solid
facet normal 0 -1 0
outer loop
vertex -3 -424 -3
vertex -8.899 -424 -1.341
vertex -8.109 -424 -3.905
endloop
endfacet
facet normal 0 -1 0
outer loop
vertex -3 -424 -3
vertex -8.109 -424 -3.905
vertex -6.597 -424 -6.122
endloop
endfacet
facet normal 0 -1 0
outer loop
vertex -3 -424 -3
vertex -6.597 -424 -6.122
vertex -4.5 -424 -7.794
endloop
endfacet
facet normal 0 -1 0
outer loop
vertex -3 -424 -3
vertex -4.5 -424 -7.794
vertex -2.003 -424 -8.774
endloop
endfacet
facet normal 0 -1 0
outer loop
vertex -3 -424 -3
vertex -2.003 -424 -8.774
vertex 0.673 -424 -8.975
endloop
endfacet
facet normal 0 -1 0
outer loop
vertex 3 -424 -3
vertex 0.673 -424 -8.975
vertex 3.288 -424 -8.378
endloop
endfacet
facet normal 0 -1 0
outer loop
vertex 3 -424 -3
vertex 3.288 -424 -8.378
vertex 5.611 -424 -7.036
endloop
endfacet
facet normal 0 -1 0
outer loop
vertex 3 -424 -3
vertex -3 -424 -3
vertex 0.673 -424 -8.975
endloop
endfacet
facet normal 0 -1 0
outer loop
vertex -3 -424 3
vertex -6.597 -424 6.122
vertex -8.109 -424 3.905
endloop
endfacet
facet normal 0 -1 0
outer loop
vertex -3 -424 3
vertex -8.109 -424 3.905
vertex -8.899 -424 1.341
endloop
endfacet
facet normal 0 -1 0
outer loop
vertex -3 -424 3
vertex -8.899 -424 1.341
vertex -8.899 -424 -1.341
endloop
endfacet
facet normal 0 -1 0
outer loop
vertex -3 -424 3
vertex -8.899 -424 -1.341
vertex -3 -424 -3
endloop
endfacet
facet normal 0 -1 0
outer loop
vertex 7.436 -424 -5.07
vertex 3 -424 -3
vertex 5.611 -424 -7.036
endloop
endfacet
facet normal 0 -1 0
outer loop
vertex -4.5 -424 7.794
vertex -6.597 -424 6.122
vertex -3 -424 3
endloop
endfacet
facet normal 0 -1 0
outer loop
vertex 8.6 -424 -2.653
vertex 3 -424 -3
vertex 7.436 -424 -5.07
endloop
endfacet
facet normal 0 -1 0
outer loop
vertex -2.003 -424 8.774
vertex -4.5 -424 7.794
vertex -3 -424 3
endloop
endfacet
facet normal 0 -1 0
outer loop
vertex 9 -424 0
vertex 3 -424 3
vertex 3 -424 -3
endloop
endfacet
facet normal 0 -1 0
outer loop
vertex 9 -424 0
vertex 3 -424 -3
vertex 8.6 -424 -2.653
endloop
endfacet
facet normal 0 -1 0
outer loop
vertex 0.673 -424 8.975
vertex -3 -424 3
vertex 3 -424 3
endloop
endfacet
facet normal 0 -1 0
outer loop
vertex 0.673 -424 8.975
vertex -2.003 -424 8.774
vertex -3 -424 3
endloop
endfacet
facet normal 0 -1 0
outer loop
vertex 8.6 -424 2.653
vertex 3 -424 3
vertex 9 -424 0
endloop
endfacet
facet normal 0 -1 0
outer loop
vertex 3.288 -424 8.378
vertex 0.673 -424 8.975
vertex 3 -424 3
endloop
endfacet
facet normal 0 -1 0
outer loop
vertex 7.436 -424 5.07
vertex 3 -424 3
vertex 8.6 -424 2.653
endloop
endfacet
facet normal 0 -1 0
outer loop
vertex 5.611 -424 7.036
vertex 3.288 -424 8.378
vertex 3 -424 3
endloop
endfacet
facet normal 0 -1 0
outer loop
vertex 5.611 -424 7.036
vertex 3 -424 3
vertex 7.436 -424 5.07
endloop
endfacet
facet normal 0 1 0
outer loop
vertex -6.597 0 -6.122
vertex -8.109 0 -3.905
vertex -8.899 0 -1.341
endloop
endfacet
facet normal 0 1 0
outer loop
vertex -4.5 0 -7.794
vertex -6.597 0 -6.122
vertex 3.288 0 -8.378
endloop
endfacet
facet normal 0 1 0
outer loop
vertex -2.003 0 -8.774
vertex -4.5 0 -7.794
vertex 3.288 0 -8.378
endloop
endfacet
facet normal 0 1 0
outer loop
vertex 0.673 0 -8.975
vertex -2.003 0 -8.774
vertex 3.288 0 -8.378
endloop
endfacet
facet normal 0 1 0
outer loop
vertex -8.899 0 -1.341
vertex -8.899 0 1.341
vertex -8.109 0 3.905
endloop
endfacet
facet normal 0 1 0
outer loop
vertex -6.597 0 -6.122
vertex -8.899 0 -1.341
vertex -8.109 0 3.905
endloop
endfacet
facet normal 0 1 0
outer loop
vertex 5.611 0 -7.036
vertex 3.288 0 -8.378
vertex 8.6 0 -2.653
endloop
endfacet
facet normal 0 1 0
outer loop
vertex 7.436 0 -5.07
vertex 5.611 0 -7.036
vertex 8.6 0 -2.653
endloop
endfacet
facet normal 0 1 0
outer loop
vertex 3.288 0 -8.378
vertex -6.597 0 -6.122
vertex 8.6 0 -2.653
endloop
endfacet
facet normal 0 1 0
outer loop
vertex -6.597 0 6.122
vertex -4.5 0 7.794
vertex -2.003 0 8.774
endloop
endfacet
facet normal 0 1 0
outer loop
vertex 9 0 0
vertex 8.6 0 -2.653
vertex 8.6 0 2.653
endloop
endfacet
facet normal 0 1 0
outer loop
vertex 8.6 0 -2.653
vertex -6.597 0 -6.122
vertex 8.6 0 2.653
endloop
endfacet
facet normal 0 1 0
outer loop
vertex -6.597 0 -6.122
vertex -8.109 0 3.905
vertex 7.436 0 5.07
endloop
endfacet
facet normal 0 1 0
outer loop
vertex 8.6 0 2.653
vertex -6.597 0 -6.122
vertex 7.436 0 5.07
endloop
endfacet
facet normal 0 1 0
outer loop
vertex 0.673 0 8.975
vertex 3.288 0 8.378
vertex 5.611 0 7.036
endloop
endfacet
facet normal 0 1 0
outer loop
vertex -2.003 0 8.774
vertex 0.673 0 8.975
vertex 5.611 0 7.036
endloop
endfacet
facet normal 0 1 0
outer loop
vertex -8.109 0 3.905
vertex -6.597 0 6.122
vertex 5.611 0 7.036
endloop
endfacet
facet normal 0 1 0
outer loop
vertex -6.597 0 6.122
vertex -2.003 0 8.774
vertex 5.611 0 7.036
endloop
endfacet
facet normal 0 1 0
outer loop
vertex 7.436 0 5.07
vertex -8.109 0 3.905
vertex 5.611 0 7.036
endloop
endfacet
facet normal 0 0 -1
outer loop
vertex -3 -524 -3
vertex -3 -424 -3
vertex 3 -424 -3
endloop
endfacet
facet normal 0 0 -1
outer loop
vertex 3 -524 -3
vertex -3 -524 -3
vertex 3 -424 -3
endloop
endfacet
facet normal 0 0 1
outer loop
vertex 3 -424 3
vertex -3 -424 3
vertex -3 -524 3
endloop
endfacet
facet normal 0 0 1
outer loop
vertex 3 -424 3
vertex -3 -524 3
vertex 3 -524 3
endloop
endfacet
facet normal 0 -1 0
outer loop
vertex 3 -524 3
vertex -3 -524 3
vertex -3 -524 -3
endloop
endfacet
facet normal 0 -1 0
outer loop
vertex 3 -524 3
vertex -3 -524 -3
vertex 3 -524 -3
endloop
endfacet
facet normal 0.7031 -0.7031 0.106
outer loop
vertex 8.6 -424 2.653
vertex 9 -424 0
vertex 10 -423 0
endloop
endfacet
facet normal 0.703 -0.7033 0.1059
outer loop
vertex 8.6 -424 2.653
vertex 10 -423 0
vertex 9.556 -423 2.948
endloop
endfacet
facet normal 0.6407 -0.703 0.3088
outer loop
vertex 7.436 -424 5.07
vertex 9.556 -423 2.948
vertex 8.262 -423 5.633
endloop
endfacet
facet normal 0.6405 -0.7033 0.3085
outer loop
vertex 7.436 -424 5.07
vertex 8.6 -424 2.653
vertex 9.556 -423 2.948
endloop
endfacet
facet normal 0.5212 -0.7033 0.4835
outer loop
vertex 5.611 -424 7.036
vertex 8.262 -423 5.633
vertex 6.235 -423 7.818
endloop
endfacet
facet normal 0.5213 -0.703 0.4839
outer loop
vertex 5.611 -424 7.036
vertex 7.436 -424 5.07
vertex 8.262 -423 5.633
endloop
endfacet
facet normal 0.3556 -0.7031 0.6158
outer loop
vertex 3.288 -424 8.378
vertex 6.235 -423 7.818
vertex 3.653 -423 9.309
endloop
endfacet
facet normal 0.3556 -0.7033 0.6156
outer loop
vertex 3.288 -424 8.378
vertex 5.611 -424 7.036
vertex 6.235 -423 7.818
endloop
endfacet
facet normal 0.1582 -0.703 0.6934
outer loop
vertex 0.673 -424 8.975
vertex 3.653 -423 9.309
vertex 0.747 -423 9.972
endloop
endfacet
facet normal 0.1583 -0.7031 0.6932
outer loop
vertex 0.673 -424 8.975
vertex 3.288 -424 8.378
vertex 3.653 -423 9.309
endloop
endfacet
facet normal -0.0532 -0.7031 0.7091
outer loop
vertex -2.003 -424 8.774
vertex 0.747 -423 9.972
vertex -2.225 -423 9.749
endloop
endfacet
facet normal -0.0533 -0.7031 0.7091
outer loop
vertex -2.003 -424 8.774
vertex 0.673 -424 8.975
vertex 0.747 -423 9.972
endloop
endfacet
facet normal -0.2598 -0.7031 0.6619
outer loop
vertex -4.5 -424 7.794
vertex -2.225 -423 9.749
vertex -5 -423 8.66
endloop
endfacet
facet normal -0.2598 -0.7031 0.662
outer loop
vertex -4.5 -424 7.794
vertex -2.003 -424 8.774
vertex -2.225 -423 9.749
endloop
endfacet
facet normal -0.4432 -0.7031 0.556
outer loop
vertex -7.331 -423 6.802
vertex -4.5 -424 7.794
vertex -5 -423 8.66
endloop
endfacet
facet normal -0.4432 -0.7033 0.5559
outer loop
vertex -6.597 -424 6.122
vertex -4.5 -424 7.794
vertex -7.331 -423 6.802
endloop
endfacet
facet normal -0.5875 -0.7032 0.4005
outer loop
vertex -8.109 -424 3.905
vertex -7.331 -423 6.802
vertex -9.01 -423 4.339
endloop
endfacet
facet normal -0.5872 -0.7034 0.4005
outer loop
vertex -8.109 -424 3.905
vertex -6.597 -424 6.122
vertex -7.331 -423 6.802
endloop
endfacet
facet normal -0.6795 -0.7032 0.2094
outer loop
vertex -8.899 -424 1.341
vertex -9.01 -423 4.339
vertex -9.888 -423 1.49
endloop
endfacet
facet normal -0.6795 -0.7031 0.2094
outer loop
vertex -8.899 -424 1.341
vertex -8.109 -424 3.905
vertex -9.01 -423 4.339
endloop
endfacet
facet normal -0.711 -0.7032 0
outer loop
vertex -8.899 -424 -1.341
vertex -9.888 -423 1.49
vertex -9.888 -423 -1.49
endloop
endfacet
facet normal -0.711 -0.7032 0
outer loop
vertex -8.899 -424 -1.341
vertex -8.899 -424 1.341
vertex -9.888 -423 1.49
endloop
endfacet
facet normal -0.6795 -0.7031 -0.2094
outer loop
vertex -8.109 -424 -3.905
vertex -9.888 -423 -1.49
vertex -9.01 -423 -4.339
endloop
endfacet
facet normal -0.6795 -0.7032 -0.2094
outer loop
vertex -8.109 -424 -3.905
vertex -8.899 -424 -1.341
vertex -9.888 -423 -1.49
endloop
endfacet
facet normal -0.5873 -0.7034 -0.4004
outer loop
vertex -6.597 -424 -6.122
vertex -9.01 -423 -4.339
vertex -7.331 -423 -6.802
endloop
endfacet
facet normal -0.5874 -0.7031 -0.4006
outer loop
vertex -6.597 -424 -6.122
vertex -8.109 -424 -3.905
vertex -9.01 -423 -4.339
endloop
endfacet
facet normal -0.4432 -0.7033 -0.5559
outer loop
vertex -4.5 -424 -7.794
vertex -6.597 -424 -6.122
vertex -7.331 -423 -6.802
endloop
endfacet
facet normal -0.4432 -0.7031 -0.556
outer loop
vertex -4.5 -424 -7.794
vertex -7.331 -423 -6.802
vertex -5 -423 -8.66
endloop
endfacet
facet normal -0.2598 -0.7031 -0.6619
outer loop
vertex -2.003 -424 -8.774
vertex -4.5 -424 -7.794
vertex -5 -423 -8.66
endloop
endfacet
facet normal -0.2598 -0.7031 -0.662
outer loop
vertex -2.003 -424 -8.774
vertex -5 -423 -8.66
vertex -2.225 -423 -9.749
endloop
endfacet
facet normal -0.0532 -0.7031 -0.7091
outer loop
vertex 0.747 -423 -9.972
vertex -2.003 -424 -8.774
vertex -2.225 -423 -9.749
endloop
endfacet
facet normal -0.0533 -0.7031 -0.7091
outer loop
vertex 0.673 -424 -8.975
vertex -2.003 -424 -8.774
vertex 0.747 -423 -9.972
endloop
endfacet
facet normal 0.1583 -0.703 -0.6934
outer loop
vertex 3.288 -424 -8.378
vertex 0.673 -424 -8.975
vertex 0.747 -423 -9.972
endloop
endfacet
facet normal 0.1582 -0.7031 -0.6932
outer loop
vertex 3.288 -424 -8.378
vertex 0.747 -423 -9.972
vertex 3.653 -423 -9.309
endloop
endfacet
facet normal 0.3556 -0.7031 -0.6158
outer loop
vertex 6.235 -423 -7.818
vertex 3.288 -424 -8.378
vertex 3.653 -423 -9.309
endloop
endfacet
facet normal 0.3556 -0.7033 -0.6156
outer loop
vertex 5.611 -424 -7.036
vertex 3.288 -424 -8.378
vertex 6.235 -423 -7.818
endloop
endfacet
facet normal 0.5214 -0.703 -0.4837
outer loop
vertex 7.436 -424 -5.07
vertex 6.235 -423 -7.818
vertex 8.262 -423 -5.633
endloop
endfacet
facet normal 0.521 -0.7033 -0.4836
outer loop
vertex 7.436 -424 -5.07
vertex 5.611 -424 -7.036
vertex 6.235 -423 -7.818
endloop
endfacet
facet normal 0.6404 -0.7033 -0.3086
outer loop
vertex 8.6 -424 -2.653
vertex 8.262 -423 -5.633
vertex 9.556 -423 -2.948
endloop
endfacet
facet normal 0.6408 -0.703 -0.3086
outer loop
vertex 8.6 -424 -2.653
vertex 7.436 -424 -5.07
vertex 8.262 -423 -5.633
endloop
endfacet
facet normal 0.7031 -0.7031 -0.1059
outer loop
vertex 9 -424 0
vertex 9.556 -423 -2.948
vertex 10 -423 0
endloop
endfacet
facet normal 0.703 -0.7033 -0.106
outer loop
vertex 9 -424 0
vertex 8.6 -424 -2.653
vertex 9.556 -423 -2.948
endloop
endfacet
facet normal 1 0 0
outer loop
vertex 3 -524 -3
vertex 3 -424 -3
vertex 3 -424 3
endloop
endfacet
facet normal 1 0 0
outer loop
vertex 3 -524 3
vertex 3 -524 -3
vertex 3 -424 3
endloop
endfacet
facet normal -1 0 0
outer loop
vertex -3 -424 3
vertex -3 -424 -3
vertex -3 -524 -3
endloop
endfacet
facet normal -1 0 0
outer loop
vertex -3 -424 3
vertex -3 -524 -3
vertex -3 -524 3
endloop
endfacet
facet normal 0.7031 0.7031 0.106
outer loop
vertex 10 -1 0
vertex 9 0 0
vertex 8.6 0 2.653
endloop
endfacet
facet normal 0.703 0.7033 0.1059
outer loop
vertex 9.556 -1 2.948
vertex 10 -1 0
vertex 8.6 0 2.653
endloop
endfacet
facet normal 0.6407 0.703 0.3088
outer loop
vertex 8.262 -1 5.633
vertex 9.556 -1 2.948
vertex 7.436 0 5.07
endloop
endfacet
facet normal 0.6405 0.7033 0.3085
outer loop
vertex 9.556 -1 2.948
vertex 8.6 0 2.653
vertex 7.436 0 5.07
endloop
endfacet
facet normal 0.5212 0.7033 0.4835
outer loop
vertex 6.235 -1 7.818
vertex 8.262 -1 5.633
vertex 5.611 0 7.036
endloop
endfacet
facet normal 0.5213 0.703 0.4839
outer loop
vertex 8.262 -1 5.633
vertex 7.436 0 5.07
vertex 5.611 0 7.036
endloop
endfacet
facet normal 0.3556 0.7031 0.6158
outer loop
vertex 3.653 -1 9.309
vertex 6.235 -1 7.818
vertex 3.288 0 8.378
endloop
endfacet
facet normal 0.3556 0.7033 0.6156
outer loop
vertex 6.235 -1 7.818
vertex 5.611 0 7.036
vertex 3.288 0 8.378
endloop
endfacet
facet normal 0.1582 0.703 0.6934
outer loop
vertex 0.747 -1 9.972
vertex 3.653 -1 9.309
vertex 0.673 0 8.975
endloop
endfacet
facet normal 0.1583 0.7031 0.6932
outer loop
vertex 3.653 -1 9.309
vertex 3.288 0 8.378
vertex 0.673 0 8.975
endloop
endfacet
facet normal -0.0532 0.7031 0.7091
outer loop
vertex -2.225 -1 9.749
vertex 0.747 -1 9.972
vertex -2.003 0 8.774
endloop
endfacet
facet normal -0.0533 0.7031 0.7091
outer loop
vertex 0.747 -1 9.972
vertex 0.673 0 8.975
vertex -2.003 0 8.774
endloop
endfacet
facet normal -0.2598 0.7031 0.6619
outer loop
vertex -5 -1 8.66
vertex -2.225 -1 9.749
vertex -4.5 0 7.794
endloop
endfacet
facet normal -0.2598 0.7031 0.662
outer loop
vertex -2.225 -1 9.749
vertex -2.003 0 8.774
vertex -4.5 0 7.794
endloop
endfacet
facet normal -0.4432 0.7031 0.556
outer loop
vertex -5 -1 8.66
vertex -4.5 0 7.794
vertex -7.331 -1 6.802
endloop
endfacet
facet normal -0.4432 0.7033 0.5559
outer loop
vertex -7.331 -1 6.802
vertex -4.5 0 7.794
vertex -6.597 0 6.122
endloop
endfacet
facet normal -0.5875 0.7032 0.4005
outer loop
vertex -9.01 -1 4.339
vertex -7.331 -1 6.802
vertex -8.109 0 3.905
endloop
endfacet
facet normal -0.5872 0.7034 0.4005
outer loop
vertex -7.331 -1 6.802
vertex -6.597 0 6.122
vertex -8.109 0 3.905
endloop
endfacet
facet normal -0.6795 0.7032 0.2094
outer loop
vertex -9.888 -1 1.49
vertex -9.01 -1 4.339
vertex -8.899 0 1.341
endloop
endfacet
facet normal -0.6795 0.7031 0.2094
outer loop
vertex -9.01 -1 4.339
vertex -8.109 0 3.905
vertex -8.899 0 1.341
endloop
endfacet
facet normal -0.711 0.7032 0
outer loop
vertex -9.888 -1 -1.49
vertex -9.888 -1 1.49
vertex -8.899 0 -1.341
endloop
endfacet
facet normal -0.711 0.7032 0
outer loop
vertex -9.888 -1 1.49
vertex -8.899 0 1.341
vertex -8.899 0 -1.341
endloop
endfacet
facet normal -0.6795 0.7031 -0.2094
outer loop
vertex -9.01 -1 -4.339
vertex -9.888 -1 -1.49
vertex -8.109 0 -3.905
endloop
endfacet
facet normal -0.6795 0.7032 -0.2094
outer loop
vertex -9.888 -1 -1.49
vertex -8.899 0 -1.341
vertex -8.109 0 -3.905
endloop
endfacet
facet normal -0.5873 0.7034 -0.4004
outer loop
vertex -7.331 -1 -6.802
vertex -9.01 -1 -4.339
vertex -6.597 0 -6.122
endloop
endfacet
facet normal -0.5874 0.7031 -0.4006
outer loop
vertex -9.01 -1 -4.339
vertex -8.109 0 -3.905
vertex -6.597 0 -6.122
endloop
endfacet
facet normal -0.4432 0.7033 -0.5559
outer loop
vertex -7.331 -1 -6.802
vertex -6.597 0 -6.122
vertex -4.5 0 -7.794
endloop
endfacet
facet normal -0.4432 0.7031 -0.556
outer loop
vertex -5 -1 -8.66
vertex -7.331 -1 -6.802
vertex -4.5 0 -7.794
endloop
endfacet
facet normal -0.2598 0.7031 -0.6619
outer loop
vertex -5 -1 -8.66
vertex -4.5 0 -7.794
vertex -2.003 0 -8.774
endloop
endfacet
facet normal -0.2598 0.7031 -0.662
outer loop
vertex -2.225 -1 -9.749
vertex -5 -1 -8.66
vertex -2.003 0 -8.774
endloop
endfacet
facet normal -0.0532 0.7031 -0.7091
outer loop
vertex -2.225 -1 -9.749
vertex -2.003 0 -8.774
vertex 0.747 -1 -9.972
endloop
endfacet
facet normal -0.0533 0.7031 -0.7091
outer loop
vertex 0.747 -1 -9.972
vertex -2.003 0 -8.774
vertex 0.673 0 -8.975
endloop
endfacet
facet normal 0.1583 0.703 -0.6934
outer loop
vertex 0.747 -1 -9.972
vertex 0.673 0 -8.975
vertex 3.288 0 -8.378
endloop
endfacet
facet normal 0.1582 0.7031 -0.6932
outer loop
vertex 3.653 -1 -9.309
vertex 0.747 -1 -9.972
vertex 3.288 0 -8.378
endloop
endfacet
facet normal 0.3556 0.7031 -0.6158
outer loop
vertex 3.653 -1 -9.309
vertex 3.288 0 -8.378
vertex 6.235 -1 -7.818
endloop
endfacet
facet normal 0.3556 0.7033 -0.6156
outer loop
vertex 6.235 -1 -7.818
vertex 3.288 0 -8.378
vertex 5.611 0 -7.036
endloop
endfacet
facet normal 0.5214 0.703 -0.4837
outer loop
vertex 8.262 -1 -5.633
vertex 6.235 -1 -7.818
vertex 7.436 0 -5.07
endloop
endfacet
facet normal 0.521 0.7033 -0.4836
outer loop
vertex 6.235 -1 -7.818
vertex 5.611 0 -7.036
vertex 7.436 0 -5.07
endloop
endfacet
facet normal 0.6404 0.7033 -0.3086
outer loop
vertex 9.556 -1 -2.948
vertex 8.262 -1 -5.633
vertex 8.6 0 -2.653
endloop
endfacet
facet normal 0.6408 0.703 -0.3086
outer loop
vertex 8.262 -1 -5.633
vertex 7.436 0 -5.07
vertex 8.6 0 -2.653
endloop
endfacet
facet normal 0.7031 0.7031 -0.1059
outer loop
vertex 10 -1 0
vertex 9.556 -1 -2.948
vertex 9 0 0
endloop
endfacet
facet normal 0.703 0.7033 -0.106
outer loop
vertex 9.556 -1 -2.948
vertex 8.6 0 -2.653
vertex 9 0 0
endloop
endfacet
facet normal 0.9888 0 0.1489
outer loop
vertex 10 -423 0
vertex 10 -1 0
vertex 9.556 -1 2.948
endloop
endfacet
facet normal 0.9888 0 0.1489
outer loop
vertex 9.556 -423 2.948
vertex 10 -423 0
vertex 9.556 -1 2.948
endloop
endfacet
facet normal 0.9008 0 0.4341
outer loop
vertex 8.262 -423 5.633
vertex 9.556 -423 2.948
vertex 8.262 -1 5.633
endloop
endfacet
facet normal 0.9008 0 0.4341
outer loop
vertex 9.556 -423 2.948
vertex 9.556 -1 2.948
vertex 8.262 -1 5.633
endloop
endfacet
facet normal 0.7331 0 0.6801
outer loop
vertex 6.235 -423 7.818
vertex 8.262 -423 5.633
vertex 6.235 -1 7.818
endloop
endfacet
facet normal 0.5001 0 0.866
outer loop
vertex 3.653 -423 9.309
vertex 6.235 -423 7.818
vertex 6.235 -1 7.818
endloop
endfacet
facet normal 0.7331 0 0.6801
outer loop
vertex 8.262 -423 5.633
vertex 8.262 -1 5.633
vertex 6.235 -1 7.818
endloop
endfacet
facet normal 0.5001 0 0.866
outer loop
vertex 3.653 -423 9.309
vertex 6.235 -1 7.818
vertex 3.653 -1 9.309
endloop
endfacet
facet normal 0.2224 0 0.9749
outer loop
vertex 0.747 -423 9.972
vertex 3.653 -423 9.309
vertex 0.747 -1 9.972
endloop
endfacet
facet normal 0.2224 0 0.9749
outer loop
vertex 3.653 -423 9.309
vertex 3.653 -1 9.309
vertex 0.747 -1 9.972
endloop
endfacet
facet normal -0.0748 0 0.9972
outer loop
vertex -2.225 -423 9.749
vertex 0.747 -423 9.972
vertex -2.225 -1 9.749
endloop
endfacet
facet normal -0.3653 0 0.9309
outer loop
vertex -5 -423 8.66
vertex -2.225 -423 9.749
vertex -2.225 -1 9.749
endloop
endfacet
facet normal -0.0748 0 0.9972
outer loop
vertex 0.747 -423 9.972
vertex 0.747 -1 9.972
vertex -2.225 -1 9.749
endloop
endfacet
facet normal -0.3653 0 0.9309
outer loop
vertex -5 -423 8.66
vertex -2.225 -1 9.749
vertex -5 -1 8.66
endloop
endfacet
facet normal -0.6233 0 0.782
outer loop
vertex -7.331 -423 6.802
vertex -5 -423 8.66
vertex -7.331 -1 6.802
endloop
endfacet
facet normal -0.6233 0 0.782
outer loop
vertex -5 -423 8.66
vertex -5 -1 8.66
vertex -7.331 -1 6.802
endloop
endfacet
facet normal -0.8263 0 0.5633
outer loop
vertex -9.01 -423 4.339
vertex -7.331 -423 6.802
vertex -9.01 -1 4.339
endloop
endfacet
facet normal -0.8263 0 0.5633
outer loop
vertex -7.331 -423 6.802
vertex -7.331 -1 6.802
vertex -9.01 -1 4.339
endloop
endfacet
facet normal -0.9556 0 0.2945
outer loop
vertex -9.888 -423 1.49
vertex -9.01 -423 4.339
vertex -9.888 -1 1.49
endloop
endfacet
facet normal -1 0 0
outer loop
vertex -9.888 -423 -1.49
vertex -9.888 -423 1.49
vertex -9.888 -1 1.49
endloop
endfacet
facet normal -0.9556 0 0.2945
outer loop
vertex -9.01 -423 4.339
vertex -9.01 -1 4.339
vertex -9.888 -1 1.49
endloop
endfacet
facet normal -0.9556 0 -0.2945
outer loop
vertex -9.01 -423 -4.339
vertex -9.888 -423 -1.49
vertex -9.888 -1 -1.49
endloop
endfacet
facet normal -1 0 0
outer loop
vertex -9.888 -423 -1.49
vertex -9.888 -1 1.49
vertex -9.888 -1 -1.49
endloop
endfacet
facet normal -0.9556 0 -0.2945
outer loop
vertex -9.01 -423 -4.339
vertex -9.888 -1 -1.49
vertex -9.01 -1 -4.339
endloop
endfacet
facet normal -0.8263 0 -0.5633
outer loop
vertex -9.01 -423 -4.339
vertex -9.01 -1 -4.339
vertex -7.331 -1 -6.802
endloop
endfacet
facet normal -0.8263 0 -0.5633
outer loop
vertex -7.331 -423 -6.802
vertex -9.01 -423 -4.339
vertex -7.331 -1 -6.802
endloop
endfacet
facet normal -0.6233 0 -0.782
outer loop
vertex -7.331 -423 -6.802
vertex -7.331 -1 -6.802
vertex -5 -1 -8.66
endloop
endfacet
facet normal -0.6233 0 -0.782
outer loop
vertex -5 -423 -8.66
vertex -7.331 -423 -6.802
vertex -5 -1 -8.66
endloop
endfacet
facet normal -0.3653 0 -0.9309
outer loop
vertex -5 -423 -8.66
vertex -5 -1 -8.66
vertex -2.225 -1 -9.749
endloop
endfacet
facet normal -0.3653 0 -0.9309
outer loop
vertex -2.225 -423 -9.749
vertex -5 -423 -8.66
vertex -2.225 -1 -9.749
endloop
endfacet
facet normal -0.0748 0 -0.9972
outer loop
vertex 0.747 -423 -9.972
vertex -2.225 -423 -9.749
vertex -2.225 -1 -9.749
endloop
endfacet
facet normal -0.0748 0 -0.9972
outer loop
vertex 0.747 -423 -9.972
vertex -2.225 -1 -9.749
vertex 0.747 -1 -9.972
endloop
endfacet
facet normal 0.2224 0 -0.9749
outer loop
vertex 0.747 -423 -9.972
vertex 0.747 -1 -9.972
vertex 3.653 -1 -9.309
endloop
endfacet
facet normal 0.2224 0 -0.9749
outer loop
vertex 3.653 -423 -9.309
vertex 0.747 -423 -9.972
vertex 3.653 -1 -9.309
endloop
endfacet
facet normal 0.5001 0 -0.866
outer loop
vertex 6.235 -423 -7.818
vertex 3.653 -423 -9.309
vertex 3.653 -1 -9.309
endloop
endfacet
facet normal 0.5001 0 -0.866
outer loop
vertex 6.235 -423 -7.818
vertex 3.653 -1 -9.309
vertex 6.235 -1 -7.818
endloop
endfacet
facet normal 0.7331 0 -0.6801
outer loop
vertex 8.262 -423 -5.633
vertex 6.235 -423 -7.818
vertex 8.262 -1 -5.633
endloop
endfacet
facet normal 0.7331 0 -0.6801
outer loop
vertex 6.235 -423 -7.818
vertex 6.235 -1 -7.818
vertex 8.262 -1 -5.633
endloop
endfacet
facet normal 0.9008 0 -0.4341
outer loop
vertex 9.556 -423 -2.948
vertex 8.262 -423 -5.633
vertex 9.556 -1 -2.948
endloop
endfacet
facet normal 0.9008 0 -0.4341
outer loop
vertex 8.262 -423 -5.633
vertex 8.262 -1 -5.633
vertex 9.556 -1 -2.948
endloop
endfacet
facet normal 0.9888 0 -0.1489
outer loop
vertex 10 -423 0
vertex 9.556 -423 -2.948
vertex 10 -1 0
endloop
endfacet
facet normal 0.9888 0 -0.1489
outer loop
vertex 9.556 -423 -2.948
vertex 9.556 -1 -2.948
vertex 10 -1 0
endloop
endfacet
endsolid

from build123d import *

# Parameters (mm, degrees)
F0_R     = 10
F1_DEPTH = 424
F2_SIZE  = 1
F3_W     = 6
F3_H     = 6
F4_DEPTH = 100


with BuildPart() as f1:
    # F0 (on Front) → F1 (new body)
    with BuildSketch(Plane.XZ):
        Circle(F0_R)
    extrude(amount=F1_DEPTH)

    # F2
    f2_edges = [f1.edges().sort_by_distance(p)[0] for p in [
        (-10, 0, 0),
        (-10, -424, 0),
    ]]
    chamfer(f2_edges, length=F2_SIZE)

    # F3 (on face) → F4 (join)
    with BuildSketch(Plane.XZ.offset(424)):
        Rectangle(F3_W, F3_H)
    extrude(amount=F4_DEPTH)


solid = f1.part
